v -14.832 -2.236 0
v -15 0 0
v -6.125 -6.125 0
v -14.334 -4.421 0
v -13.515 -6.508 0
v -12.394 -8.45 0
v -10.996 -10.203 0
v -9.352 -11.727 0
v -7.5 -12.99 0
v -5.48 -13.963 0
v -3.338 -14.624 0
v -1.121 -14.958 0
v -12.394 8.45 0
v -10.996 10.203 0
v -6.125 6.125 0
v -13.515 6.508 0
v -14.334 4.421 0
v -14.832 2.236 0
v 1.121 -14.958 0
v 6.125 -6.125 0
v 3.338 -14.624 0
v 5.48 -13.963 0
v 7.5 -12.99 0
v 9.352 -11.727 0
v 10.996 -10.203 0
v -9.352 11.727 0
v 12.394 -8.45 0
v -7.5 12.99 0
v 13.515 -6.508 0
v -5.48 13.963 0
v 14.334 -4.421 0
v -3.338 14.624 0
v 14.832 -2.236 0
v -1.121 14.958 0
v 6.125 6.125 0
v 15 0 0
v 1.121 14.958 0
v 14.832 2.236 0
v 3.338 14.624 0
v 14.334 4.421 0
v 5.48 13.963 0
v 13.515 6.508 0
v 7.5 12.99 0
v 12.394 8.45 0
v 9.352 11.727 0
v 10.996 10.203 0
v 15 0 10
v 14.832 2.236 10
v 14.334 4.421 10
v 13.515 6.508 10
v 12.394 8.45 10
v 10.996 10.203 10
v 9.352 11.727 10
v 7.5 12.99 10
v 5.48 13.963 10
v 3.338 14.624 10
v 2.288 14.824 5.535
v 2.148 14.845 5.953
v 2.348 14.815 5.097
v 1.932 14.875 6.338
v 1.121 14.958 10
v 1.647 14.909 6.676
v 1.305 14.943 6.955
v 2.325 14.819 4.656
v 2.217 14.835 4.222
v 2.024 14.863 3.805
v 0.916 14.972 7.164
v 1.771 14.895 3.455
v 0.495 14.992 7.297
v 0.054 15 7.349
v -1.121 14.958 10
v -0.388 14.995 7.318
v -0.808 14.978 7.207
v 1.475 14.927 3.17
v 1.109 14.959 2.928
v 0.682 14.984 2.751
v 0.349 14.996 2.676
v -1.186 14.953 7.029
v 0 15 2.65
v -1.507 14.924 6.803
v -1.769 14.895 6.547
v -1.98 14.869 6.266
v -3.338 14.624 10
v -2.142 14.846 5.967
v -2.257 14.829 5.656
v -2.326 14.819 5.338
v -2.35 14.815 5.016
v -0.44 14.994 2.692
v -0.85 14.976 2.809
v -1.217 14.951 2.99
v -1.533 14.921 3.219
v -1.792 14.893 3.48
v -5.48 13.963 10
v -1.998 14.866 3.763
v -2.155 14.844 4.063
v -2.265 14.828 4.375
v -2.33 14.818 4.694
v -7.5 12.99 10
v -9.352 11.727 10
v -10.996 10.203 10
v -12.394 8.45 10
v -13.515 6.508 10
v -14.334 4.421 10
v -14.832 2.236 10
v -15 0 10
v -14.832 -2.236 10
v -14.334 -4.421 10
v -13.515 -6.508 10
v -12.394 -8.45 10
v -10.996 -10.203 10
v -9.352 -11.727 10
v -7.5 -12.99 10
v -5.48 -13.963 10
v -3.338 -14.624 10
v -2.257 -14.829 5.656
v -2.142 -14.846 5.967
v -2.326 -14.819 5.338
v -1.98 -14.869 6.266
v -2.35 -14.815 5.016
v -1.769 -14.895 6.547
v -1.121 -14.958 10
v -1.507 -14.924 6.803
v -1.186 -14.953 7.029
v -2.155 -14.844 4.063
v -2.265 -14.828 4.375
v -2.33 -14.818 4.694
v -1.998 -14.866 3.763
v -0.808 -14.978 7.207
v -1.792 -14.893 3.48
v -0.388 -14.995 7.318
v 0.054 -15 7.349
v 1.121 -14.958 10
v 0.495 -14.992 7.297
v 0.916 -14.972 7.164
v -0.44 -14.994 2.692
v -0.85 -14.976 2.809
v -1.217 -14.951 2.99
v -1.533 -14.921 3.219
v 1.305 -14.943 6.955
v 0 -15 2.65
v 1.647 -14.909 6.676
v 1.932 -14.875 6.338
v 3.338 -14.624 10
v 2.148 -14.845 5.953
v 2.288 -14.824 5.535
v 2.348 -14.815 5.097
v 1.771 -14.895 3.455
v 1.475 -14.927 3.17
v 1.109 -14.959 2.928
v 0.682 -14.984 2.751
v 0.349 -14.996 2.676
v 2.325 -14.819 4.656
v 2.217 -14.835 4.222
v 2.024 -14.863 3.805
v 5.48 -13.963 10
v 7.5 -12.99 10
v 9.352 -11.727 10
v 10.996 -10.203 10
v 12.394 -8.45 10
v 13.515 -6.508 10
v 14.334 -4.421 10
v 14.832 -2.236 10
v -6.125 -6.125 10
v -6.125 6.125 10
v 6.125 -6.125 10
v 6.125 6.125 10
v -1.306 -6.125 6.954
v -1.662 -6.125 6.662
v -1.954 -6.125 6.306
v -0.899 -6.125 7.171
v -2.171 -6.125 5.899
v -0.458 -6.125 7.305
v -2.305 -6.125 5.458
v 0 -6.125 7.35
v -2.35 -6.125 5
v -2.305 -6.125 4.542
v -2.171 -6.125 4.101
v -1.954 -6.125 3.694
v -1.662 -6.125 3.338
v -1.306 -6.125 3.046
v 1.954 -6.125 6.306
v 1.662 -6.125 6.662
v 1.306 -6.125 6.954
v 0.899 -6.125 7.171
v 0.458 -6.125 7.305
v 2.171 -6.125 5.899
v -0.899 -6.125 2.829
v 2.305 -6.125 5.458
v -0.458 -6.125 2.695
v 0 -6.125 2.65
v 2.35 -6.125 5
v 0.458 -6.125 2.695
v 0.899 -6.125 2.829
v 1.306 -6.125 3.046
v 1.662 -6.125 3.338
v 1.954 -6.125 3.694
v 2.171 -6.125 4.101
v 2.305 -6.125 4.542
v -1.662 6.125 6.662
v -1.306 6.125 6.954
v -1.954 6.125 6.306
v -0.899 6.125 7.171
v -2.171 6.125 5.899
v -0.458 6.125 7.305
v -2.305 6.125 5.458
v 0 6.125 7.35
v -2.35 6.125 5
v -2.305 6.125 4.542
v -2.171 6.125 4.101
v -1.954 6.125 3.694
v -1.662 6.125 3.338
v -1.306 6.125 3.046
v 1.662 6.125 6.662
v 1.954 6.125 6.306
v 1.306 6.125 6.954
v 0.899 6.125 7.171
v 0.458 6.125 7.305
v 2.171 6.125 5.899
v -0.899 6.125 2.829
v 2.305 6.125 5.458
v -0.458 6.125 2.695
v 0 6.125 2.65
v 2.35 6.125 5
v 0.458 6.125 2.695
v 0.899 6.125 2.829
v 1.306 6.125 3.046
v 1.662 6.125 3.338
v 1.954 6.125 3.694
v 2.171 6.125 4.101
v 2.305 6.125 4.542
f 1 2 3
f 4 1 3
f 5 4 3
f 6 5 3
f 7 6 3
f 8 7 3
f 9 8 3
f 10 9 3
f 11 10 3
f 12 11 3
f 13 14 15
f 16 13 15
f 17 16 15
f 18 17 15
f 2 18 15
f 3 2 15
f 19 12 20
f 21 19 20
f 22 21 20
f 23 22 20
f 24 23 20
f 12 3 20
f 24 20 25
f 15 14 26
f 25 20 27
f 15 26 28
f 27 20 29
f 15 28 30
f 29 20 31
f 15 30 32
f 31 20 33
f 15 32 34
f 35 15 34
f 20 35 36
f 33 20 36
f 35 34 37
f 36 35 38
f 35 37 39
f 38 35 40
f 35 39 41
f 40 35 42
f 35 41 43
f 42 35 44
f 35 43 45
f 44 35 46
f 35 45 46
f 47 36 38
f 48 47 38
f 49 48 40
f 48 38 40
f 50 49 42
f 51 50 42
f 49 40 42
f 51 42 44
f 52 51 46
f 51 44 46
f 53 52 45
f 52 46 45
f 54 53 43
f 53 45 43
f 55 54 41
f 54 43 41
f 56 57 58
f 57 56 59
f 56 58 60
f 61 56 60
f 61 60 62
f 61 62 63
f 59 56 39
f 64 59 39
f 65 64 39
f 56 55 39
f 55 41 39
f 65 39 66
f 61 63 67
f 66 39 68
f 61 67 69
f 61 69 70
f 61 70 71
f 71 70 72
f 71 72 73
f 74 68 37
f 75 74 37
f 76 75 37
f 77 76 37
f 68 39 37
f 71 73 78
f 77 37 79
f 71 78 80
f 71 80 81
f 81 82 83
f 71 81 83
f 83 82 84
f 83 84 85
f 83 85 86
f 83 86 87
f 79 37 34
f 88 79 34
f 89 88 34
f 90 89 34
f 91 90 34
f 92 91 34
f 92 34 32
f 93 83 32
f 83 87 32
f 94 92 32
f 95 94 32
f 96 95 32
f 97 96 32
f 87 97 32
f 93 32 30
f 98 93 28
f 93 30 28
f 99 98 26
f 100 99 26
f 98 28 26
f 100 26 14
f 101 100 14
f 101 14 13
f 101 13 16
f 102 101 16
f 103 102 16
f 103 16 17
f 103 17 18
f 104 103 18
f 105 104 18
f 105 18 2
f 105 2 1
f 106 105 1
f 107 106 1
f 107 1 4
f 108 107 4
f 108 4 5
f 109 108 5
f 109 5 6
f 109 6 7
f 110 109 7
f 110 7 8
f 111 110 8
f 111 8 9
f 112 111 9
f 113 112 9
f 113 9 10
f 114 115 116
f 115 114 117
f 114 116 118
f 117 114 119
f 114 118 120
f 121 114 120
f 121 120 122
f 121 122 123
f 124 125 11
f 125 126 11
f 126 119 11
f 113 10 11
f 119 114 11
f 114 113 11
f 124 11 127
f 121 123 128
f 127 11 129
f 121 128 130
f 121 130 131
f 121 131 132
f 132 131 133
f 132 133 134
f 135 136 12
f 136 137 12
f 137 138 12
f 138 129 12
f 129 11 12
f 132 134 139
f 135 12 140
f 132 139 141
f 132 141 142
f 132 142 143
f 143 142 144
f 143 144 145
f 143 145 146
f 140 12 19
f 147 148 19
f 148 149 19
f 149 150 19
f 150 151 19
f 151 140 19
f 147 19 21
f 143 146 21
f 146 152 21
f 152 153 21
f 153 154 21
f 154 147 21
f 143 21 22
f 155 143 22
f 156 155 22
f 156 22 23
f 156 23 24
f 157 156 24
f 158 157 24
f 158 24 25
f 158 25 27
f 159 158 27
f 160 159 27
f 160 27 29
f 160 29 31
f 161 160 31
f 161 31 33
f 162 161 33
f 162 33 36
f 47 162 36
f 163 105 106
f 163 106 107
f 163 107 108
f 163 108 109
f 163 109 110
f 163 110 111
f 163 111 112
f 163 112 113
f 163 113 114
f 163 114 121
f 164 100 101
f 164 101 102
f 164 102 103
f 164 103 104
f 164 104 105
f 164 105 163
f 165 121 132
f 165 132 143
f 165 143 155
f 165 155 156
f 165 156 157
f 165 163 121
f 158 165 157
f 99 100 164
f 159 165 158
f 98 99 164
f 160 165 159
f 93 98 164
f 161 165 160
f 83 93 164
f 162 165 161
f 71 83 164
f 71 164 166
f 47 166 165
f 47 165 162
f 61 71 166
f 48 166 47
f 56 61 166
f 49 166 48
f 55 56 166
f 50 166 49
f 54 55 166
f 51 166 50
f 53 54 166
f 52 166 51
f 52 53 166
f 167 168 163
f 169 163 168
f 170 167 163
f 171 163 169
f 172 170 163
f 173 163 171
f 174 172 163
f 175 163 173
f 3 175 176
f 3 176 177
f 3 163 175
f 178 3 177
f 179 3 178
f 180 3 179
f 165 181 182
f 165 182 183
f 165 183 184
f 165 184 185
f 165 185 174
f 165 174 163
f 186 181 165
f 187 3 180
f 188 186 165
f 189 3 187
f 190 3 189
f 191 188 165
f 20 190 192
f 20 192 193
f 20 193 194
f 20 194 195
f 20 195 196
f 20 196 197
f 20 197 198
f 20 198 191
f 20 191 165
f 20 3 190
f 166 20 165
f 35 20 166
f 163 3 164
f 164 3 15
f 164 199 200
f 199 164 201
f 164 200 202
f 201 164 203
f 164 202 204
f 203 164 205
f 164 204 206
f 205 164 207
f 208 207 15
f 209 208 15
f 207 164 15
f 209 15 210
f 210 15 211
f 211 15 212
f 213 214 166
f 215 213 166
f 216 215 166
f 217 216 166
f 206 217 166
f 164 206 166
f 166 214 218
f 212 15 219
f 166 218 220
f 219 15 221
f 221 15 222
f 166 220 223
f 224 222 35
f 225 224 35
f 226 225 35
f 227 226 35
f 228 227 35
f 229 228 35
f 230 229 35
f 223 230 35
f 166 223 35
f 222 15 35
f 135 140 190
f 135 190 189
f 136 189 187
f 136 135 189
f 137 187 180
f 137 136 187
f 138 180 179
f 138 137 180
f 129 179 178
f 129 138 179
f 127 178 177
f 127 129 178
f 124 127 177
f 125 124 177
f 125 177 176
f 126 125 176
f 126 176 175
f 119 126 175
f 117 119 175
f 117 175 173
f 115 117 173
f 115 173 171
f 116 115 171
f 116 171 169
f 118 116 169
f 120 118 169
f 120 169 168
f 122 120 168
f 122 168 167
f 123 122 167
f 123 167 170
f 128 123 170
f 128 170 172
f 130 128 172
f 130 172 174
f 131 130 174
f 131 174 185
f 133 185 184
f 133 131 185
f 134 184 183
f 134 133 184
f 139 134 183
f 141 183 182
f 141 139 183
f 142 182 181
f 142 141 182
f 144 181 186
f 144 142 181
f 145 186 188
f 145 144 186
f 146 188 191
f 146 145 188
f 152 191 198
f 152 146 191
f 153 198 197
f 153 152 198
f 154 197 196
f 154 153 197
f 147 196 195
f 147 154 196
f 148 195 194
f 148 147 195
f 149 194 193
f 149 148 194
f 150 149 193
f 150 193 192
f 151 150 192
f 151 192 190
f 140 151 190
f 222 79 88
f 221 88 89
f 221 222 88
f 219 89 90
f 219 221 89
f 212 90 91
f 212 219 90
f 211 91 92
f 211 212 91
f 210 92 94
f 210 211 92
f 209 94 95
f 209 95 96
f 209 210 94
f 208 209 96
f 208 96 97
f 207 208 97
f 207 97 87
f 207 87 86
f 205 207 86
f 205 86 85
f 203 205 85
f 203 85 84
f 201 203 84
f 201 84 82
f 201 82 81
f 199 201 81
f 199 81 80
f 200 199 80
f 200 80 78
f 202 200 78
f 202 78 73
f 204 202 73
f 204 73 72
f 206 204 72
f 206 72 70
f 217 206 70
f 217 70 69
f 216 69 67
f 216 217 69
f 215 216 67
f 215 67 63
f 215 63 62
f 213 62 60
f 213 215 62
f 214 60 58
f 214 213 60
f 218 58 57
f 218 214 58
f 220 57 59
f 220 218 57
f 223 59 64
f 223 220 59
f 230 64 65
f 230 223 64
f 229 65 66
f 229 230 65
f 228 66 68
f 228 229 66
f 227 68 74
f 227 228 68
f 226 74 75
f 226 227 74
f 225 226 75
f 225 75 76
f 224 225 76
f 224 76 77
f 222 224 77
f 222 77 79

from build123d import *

# Parameters (mm, degrees)
ESBO_O1_R                  = 15
ESBO_O1_W                  = 12.25
ESBO_O1_H                  = 12.25
RESSALTO_EXTRUS_O1_DEPTH   = 10
CORTE_EXTRUS_O1_DEPTH      = 24
CORTE_EXTRUS_O1_DEPTH_BACK = 24
ESBO_O2_R                  = 2.35


with BuildPart() as part:
    # Esboço1 → Ressalto-extrusão1 (new body)
    with BuildSketch(Plane.XY):
        Circle(ESBO_O1_R)
        Rectangle(ESBO_O1_W, ESBO_O1_H, mode=Mode.SUBTRACT)
    extrude(amount=RESSALTO_EXTRUS_O1_DEPTH)

    # Esboço2 → Corte-extrusão1 (cut, two sides: drawn at the far end of the back side and taken through both)
    with BuildSketch(Plane(origin=(0, 0, 0), x_dir=(1, 0, 0), z_dir=(0, 1, 0)).offset(-CORTE_EXTRUS_O1_DEPTH_BACK)):
        with Locations(Location((0, -5, 0), (0, 0, 90))):
            Circle(ESBO_O2_R)
    extrude(amount=CORTE_EXTRUS_O1_DEPTH + CORTE_EXTRUS_O1_DEPTH_BACK, mode=Mode.SUBTRACT)


solid = part.part
